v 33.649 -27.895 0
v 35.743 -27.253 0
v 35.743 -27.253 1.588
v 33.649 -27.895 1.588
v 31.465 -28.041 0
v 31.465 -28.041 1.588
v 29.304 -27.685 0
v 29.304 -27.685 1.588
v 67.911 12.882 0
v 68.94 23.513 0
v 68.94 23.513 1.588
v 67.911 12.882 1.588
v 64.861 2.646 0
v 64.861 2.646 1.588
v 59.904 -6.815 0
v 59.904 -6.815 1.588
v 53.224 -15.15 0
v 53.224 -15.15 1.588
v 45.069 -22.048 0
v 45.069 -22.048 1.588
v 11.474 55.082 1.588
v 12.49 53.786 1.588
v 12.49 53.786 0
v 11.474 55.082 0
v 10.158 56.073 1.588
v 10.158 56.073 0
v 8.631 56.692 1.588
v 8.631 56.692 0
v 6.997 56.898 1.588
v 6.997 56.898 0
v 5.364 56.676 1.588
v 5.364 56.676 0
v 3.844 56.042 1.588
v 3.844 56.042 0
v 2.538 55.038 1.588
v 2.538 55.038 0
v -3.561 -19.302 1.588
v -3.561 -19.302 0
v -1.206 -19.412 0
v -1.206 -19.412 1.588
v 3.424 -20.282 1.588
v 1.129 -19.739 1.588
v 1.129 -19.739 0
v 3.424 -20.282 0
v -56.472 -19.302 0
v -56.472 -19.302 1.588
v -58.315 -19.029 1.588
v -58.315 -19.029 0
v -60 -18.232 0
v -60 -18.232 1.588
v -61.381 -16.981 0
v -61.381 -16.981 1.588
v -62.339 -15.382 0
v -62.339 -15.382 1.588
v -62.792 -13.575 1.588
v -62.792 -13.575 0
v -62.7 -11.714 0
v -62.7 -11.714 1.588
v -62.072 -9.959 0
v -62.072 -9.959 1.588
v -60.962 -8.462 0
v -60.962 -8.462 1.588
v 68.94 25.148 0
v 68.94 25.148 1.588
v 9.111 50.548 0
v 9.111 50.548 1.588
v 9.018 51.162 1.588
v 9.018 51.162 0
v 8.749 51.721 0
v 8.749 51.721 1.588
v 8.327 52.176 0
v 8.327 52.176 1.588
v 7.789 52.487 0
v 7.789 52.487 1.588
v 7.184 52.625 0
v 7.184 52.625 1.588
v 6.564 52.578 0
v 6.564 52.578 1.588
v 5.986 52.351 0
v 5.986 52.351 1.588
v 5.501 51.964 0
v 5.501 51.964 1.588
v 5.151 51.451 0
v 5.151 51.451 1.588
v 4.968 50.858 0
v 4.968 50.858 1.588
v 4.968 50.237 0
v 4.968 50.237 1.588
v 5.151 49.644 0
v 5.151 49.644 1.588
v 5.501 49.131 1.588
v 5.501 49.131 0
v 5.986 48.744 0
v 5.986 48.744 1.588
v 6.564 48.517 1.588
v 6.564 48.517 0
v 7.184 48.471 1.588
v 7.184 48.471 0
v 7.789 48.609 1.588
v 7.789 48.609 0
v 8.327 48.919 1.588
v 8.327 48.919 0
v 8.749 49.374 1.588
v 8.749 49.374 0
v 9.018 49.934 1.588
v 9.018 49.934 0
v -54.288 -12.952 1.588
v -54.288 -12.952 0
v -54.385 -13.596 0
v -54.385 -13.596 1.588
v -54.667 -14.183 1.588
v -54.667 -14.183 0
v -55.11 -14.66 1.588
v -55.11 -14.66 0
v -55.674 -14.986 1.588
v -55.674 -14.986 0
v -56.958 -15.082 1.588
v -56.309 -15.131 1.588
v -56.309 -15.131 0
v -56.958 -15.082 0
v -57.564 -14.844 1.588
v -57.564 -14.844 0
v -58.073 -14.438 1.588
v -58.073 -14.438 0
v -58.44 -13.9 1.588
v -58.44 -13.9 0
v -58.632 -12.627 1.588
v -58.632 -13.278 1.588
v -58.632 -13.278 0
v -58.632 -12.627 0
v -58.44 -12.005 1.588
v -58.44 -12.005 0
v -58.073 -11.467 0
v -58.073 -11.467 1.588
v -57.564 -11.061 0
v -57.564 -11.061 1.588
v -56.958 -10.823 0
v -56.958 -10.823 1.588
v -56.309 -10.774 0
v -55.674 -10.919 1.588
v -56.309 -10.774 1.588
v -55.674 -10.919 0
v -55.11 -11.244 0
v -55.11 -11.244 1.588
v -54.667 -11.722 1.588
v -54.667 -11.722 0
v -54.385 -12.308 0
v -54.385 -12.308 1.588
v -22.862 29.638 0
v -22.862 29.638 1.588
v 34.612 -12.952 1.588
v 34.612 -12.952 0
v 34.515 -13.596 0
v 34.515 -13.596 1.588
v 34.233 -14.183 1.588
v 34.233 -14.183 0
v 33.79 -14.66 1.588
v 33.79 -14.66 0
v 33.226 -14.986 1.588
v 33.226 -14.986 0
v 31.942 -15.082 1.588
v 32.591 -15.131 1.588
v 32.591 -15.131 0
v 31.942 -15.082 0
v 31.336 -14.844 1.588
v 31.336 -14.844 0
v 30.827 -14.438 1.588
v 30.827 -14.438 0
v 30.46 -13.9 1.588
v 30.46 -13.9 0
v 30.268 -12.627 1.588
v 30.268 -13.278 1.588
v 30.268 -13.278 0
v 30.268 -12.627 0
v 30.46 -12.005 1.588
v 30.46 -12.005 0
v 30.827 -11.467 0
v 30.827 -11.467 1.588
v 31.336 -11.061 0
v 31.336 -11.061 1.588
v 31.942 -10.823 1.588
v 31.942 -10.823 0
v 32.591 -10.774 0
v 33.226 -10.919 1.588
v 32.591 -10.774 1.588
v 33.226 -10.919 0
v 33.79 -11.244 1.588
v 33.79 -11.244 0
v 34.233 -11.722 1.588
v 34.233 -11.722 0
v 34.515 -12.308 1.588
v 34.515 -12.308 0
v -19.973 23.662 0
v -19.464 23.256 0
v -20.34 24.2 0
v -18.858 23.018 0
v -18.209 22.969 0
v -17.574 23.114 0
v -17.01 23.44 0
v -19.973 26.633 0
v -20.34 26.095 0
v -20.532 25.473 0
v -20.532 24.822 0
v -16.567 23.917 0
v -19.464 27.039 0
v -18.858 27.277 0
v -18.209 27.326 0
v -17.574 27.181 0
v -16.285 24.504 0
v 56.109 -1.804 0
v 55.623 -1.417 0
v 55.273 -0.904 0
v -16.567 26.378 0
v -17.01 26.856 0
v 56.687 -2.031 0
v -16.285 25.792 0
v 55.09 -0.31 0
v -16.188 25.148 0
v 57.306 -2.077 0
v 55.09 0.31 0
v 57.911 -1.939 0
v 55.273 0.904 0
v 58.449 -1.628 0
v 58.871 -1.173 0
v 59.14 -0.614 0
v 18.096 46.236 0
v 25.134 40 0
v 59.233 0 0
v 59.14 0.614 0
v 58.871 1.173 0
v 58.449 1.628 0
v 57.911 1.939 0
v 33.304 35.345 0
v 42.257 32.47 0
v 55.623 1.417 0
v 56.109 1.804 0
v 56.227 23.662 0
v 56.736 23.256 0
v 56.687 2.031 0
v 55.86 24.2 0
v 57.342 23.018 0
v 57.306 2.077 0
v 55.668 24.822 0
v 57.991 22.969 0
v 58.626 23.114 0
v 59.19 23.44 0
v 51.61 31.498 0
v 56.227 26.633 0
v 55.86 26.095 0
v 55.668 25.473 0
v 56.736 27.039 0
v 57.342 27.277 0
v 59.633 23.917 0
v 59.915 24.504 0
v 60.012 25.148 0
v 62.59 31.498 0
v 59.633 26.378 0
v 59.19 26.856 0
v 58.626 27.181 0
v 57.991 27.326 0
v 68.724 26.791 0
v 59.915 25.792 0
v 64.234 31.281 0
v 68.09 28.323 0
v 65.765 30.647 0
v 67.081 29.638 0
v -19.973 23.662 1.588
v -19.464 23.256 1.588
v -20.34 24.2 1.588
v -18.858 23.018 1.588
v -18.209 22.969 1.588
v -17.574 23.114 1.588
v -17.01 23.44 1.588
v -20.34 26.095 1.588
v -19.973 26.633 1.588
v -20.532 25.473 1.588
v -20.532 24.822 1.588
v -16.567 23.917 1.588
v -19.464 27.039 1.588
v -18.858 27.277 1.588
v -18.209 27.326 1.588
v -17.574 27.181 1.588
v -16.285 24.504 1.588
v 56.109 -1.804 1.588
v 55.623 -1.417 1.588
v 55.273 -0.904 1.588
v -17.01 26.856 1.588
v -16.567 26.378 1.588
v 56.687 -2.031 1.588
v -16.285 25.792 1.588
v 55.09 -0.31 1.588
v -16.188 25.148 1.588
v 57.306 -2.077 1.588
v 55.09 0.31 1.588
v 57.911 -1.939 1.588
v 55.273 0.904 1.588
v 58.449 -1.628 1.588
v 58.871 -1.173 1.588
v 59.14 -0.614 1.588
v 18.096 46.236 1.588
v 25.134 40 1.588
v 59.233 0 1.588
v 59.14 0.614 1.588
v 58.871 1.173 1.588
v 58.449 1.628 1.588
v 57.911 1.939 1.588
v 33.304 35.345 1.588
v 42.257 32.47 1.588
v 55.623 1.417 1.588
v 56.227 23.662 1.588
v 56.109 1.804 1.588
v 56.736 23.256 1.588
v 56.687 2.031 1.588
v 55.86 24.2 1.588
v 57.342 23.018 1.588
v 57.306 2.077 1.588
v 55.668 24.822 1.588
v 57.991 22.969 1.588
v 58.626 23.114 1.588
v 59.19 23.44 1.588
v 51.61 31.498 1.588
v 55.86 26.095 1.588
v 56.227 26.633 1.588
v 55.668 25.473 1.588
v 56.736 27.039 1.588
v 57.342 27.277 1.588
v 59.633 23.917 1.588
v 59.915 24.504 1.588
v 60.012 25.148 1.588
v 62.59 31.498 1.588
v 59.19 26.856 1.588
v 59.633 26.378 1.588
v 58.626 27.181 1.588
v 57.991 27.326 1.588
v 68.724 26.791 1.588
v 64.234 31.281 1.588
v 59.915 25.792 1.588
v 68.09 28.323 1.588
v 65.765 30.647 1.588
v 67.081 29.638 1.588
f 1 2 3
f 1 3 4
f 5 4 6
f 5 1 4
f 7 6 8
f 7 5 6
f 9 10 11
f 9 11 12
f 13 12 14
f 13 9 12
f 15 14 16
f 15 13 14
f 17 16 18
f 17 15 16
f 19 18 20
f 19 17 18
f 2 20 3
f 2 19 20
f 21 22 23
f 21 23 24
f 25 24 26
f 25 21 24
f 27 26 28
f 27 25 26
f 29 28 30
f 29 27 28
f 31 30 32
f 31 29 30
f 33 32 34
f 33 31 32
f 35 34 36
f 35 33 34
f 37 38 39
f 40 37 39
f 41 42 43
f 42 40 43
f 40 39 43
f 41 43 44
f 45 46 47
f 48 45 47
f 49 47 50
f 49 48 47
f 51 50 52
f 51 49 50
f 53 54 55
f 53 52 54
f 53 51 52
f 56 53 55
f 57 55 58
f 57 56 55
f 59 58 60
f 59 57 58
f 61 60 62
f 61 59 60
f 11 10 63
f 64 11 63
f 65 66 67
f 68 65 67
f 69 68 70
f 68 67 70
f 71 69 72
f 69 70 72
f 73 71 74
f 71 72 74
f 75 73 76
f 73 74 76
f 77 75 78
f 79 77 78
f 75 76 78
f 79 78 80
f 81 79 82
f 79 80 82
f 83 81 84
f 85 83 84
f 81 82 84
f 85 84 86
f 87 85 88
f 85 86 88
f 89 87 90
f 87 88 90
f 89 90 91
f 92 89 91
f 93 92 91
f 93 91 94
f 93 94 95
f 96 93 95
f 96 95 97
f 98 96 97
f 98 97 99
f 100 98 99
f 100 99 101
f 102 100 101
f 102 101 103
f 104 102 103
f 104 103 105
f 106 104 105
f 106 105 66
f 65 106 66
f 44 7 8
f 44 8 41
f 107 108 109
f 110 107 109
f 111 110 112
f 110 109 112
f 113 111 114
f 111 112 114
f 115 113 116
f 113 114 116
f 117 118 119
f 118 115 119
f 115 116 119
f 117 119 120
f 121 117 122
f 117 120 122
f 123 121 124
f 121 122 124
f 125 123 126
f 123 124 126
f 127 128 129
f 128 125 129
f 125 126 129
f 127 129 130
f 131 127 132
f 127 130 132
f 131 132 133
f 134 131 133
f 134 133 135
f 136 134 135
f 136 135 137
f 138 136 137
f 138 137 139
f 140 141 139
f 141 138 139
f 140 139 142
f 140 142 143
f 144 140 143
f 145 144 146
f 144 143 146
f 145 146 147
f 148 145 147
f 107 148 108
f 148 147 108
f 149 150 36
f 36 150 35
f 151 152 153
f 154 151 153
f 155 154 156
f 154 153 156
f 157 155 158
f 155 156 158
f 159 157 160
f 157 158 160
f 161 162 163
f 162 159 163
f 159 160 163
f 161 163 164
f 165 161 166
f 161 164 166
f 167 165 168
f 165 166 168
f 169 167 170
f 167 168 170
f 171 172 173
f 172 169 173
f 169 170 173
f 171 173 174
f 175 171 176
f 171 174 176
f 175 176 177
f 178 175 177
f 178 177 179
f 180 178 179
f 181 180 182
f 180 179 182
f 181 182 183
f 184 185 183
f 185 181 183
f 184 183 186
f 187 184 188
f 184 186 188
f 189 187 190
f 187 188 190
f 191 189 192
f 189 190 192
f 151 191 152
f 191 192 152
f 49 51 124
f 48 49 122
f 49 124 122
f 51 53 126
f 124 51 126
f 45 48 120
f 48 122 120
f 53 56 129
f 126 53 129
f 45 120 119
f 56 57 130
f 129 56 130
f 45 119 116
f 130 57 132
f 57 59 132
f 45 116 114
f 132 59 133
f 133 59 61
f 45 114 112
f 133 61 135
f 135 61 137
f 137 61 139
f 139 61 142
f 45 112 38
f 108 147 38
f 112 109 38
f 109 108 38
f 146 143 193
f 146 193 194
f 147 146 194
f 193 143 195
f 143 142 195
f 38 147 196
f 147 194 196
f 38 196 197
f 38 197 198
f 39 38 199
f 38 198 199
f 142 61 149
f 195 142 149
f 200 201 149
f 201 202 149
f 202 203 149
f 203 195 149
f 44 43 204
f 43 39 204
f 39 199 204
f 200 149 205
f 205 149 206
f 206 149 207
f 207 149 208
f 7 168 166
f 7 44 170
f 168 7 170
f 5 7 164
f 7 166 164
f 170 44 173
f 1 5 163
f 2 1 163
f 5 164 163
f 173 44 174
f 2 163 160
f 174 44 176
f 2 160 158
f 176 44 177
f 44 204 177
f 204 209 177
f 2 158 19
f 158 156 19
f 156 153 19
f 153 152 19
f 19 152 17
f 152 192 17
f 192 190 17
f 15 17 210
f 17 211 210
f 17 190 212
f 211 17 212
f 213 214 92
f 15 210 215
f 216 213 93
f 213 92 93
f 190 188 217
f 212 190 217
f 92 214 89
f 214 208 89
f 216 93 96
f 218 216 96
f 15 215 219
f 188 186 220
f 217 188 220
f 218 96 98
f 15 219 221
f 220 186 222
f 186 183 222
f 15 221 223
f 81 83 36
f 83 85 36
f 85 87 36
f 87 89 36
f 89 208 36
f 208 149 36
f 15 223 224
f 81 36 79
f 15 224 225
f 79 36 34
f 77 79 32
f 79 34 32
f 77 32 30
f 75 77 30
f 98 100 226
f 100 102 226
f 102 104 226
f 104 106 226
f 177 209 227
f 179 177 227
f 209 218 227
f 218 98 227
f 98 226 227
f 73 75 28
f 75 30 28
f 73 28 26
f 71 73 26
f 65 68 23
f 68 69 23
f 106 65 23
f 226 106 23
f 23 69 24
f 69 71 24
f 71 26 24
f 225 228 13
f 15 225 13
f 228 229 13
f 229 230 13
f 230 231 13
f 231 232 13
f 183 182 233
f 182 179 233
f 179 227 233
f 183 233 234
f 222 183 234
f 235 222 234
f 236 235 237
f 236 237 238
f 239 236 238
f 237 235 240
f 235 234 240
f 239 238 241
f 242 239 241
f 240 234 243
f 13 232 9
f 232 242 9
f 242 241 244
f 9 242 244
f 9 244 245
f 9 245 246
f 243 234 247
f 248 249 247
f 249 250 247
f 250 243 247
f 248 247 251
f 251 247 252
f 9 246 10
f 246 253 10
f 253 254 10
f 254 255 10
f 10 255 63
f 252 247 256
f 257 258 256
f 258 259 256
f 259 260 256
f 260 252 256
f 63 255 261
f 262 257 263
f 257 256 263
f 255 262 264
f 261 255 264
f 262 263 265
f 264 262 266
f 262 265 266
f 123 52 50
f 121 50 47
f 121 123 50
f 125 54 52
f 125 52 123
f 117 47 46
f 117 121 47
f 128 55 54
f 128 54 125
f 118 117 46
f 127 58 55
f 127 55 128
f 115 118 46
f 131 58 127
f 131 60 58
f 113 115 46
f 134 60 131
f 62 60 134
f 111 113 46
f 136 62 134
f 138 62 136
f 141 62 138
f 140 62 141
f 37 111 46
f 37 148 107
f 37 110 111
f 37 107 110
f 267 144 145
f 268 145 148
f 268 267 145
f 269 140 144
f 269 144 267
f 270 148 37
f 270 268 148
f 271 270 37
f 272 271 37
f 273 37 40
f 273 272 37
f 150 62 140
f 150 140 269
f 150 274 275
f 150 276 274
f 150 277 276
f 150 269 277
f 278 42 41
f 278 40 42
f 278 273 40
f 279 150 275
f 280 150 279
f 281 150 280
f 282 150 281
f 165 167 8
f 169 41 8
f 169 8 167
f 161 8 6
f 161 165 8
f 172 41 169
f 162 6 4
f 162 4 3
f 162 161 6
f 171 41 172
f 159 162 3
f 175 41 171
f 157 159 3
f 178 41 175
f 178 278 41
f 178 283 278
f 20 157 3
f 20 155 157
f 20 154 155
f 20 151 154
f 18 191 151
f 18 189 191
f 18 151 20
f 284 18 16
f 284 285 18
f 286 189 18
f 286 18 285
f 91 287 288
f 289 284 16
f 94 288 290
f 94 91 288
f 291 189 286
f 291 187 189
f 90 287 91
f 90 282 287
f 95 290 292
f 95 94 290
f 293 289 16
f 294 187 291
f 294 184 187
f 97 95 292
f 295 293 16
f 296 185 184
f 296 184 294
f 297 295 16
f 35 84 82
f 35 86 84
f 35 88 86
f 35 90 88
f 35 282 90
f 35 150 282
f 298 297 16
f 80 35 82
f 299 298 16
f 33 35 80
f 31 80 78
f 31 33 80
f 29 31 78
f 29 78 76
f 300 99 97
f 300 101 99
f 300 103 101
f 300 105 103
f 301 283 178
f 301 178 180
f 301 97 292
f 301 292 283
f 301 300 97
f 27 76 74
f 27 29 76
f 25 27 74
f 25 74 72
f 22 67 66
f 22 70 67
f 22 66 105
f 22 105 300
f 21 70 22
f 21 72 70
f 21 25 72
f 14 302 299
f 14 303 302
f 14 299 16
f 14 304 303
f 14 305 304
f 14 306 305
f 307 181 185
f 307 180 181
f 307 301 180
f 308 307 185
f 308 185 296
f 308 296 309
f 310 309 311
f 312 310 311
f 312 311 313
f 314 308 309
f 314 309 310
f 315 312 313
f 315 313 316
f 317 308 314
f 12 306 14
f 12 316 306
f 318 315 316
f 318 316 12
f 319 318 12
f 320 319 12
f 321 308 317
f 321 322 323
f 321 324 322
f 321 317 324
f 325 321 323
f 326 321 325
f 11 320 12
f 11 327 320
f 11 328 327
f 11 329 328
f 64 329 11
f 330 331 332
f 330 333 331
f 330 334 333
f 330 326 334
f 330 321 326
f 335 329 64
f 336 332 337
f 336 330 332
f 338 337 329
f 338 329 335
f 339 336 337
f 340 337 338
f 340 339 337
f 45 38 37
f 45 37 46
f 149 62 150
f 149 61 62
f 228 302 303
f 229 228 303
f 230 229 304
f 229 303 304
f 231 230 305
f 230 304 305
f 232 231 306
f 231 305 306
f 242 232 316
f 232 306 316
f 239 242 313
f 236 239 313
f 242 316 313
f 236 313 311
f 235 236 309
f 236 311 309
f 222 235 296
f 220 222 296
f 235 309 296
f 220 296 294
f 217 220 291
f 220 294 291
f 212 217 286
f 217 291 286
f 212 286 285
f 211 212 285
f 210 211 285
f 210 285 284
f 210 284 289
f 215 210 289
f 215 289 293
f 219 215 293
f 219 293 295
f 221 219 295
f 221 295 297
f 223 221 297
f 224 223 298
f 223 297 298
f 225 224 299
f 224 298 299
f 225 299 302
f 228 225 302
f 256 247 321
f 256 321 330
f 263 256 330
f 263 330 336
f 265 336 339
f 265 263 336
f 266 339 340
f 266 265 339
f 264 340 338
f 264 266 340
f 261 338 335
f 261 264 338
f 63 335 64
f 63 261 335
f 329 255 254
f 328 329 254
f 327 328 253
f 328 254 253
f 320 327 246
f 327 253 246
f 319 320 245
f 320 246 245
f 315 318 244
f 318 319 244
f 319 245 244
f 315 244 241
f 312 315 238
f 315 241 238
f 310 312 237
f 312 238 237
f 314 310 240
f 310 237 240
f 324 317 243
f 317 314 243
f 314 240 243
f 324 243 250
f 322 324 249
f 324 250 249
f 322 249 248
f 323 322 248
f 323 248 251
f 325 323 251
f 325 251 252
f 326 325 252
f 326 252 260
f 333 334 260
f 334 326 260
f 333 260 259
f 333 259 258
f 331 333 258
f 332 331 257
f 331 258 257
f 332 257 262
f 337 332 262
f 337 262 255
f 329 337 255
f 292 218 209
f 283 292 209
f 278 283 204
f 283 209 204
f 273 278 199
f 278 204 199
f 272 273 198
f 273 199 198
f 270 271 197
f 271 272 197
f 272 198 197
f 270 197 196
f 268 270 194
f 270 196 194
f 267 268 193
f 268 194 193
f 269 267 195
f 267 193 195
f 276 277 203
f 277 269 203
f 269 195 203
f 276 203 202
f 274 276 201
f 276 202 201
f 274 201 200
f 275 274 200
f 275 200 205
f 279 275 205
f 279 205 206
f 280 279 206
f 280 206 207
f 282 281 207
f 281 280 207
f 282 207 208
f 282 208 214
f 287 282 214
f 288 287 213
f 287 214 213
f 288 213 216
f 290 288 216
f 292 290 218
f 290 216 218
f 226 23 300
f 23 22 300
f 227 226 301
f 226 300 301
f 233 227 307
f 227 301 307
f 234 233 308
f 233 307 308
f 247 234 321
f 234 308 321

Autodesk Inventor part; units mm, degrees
ref_plane "YZ Plane" through (0, 0, 0) normal (1, 0, 0) x (0, 1, 0)
ref_plane "XZ Plane" through (0, 0, 0) normal (0, 1, 0) x (-1, 0, 0)
ref_plane "XY Plane" through (0, 0, 0) normal (0, 0, 1) x (1, 0, 0)
sketch "Sketch1" plane through (0, 0, 0) normal (0, 0, 1) x (1, 0, 0)
  circle A0 centre (-18.3721, 25.1477) radius 2.1844
  circle A1 centre (57.8279, 25.1477) radius 2.1844
  circle A2 centre (32.4279, -12.9523) radius 2.1844
  circle A3 centre (-56.4721, -12.9523) radius 2.1844
  arc A4 (-60.9623, -8.4622) -> (-56.4721, -19.3023) centre (-56.4721, -12.9523) ccw
  arc A5 (-18.3721, 31.4977) -> (-22.8623, 29.6378) centre (-18.3721, 25.1477) ccw
  line L0 (68.9404, 23.5133) -> (68.9404, 25.1477)
  line L1 (62.5904, 31.4977) -> (57.8279, 31.4977)
  arc A6 (68.9404, 25.1477) -> (62.5904, 31.4977) centre (62.5904, 25.1477) ccw
  line L2 (-3.5614, -19.3023) -> (-56.4721, -19.3023)
  line L3 (-60.9623, -8.4622) -> (-22.8623, 29.6378)
  line L4 (-18.3721, 31.4977) -> (57.8279, 31.4977)
  arc A7 (35.7428, -27.2531) -> (68.9404, 23.5133) centre (13.525, 23.5133) ccw
  line L5 (29.3044, -27.6849) -> (3.4241, -20.2818)
  arc A8 (29.3044, -27.6849) -> (35.7428, -27.2531) centre (31.9239, -18.5272) ccw
  arc A9 (3.4241, -20.2818) -> (-3.5614, -19.3023) centre (-3.5614, -44.7023) ccw
  point P0 (0, 0)
  point P1 (32.4279, -28.5784)
  dimension "d0" = 4.3688
  dimension "d1" = 12.7
  dimension "d2" = 12.7
  dimension "d4" = 6.35
  dimension "d21" = 9.525
  dimension "d22" = 25.4
extrude "Extrusion1" add sketch "Sketch1" along normal blind 1.5875
sketch "Sketch2" plane through (0, 0, 1.5875) normal (0, 0, 1) x (1, 0, 0)
  circle A0 centre (57.15, 0) radius 2.0828
  point P0 (0, 0)
  dimension "d7" = 4.1656
extrude "Extrusion2" cut sketch "Sketch2" against normal blind 1.5875
sketch "Sketch3" plane through (57.8279, 25.1477, 1.5875) normal (0, 0, 1) x (1, 0, 0)
  circle A0 centre (-50.8, 25.4) radius 2.0828
  arc A1 (-45.3375, 28.6378) -> (-55.2901, 29.8901) centre (-50.8, 25.4) ccw
  line L0 (-80.6901, 4.4901) -> (-55.2901, 29.8901)
  arc A2 (-76.2, 6.35) -> (-80.6901, 4.4901) centre (-76.2, 0) ccw projected
  arc A3 (-45.3375, 28.6378) -> (-6.2178, 6.35) centre (-6.2178, 51.8254) ccw
  line L1 (4.7625, 6.35) -> (-76.2, 6.35) projected
  dimension "d17" = 4.1656
extrude "Extrusion4" add sketch "Sketch3" against normal blind 1.5875
properties part number "sled" material "Acetal Resin, White"
